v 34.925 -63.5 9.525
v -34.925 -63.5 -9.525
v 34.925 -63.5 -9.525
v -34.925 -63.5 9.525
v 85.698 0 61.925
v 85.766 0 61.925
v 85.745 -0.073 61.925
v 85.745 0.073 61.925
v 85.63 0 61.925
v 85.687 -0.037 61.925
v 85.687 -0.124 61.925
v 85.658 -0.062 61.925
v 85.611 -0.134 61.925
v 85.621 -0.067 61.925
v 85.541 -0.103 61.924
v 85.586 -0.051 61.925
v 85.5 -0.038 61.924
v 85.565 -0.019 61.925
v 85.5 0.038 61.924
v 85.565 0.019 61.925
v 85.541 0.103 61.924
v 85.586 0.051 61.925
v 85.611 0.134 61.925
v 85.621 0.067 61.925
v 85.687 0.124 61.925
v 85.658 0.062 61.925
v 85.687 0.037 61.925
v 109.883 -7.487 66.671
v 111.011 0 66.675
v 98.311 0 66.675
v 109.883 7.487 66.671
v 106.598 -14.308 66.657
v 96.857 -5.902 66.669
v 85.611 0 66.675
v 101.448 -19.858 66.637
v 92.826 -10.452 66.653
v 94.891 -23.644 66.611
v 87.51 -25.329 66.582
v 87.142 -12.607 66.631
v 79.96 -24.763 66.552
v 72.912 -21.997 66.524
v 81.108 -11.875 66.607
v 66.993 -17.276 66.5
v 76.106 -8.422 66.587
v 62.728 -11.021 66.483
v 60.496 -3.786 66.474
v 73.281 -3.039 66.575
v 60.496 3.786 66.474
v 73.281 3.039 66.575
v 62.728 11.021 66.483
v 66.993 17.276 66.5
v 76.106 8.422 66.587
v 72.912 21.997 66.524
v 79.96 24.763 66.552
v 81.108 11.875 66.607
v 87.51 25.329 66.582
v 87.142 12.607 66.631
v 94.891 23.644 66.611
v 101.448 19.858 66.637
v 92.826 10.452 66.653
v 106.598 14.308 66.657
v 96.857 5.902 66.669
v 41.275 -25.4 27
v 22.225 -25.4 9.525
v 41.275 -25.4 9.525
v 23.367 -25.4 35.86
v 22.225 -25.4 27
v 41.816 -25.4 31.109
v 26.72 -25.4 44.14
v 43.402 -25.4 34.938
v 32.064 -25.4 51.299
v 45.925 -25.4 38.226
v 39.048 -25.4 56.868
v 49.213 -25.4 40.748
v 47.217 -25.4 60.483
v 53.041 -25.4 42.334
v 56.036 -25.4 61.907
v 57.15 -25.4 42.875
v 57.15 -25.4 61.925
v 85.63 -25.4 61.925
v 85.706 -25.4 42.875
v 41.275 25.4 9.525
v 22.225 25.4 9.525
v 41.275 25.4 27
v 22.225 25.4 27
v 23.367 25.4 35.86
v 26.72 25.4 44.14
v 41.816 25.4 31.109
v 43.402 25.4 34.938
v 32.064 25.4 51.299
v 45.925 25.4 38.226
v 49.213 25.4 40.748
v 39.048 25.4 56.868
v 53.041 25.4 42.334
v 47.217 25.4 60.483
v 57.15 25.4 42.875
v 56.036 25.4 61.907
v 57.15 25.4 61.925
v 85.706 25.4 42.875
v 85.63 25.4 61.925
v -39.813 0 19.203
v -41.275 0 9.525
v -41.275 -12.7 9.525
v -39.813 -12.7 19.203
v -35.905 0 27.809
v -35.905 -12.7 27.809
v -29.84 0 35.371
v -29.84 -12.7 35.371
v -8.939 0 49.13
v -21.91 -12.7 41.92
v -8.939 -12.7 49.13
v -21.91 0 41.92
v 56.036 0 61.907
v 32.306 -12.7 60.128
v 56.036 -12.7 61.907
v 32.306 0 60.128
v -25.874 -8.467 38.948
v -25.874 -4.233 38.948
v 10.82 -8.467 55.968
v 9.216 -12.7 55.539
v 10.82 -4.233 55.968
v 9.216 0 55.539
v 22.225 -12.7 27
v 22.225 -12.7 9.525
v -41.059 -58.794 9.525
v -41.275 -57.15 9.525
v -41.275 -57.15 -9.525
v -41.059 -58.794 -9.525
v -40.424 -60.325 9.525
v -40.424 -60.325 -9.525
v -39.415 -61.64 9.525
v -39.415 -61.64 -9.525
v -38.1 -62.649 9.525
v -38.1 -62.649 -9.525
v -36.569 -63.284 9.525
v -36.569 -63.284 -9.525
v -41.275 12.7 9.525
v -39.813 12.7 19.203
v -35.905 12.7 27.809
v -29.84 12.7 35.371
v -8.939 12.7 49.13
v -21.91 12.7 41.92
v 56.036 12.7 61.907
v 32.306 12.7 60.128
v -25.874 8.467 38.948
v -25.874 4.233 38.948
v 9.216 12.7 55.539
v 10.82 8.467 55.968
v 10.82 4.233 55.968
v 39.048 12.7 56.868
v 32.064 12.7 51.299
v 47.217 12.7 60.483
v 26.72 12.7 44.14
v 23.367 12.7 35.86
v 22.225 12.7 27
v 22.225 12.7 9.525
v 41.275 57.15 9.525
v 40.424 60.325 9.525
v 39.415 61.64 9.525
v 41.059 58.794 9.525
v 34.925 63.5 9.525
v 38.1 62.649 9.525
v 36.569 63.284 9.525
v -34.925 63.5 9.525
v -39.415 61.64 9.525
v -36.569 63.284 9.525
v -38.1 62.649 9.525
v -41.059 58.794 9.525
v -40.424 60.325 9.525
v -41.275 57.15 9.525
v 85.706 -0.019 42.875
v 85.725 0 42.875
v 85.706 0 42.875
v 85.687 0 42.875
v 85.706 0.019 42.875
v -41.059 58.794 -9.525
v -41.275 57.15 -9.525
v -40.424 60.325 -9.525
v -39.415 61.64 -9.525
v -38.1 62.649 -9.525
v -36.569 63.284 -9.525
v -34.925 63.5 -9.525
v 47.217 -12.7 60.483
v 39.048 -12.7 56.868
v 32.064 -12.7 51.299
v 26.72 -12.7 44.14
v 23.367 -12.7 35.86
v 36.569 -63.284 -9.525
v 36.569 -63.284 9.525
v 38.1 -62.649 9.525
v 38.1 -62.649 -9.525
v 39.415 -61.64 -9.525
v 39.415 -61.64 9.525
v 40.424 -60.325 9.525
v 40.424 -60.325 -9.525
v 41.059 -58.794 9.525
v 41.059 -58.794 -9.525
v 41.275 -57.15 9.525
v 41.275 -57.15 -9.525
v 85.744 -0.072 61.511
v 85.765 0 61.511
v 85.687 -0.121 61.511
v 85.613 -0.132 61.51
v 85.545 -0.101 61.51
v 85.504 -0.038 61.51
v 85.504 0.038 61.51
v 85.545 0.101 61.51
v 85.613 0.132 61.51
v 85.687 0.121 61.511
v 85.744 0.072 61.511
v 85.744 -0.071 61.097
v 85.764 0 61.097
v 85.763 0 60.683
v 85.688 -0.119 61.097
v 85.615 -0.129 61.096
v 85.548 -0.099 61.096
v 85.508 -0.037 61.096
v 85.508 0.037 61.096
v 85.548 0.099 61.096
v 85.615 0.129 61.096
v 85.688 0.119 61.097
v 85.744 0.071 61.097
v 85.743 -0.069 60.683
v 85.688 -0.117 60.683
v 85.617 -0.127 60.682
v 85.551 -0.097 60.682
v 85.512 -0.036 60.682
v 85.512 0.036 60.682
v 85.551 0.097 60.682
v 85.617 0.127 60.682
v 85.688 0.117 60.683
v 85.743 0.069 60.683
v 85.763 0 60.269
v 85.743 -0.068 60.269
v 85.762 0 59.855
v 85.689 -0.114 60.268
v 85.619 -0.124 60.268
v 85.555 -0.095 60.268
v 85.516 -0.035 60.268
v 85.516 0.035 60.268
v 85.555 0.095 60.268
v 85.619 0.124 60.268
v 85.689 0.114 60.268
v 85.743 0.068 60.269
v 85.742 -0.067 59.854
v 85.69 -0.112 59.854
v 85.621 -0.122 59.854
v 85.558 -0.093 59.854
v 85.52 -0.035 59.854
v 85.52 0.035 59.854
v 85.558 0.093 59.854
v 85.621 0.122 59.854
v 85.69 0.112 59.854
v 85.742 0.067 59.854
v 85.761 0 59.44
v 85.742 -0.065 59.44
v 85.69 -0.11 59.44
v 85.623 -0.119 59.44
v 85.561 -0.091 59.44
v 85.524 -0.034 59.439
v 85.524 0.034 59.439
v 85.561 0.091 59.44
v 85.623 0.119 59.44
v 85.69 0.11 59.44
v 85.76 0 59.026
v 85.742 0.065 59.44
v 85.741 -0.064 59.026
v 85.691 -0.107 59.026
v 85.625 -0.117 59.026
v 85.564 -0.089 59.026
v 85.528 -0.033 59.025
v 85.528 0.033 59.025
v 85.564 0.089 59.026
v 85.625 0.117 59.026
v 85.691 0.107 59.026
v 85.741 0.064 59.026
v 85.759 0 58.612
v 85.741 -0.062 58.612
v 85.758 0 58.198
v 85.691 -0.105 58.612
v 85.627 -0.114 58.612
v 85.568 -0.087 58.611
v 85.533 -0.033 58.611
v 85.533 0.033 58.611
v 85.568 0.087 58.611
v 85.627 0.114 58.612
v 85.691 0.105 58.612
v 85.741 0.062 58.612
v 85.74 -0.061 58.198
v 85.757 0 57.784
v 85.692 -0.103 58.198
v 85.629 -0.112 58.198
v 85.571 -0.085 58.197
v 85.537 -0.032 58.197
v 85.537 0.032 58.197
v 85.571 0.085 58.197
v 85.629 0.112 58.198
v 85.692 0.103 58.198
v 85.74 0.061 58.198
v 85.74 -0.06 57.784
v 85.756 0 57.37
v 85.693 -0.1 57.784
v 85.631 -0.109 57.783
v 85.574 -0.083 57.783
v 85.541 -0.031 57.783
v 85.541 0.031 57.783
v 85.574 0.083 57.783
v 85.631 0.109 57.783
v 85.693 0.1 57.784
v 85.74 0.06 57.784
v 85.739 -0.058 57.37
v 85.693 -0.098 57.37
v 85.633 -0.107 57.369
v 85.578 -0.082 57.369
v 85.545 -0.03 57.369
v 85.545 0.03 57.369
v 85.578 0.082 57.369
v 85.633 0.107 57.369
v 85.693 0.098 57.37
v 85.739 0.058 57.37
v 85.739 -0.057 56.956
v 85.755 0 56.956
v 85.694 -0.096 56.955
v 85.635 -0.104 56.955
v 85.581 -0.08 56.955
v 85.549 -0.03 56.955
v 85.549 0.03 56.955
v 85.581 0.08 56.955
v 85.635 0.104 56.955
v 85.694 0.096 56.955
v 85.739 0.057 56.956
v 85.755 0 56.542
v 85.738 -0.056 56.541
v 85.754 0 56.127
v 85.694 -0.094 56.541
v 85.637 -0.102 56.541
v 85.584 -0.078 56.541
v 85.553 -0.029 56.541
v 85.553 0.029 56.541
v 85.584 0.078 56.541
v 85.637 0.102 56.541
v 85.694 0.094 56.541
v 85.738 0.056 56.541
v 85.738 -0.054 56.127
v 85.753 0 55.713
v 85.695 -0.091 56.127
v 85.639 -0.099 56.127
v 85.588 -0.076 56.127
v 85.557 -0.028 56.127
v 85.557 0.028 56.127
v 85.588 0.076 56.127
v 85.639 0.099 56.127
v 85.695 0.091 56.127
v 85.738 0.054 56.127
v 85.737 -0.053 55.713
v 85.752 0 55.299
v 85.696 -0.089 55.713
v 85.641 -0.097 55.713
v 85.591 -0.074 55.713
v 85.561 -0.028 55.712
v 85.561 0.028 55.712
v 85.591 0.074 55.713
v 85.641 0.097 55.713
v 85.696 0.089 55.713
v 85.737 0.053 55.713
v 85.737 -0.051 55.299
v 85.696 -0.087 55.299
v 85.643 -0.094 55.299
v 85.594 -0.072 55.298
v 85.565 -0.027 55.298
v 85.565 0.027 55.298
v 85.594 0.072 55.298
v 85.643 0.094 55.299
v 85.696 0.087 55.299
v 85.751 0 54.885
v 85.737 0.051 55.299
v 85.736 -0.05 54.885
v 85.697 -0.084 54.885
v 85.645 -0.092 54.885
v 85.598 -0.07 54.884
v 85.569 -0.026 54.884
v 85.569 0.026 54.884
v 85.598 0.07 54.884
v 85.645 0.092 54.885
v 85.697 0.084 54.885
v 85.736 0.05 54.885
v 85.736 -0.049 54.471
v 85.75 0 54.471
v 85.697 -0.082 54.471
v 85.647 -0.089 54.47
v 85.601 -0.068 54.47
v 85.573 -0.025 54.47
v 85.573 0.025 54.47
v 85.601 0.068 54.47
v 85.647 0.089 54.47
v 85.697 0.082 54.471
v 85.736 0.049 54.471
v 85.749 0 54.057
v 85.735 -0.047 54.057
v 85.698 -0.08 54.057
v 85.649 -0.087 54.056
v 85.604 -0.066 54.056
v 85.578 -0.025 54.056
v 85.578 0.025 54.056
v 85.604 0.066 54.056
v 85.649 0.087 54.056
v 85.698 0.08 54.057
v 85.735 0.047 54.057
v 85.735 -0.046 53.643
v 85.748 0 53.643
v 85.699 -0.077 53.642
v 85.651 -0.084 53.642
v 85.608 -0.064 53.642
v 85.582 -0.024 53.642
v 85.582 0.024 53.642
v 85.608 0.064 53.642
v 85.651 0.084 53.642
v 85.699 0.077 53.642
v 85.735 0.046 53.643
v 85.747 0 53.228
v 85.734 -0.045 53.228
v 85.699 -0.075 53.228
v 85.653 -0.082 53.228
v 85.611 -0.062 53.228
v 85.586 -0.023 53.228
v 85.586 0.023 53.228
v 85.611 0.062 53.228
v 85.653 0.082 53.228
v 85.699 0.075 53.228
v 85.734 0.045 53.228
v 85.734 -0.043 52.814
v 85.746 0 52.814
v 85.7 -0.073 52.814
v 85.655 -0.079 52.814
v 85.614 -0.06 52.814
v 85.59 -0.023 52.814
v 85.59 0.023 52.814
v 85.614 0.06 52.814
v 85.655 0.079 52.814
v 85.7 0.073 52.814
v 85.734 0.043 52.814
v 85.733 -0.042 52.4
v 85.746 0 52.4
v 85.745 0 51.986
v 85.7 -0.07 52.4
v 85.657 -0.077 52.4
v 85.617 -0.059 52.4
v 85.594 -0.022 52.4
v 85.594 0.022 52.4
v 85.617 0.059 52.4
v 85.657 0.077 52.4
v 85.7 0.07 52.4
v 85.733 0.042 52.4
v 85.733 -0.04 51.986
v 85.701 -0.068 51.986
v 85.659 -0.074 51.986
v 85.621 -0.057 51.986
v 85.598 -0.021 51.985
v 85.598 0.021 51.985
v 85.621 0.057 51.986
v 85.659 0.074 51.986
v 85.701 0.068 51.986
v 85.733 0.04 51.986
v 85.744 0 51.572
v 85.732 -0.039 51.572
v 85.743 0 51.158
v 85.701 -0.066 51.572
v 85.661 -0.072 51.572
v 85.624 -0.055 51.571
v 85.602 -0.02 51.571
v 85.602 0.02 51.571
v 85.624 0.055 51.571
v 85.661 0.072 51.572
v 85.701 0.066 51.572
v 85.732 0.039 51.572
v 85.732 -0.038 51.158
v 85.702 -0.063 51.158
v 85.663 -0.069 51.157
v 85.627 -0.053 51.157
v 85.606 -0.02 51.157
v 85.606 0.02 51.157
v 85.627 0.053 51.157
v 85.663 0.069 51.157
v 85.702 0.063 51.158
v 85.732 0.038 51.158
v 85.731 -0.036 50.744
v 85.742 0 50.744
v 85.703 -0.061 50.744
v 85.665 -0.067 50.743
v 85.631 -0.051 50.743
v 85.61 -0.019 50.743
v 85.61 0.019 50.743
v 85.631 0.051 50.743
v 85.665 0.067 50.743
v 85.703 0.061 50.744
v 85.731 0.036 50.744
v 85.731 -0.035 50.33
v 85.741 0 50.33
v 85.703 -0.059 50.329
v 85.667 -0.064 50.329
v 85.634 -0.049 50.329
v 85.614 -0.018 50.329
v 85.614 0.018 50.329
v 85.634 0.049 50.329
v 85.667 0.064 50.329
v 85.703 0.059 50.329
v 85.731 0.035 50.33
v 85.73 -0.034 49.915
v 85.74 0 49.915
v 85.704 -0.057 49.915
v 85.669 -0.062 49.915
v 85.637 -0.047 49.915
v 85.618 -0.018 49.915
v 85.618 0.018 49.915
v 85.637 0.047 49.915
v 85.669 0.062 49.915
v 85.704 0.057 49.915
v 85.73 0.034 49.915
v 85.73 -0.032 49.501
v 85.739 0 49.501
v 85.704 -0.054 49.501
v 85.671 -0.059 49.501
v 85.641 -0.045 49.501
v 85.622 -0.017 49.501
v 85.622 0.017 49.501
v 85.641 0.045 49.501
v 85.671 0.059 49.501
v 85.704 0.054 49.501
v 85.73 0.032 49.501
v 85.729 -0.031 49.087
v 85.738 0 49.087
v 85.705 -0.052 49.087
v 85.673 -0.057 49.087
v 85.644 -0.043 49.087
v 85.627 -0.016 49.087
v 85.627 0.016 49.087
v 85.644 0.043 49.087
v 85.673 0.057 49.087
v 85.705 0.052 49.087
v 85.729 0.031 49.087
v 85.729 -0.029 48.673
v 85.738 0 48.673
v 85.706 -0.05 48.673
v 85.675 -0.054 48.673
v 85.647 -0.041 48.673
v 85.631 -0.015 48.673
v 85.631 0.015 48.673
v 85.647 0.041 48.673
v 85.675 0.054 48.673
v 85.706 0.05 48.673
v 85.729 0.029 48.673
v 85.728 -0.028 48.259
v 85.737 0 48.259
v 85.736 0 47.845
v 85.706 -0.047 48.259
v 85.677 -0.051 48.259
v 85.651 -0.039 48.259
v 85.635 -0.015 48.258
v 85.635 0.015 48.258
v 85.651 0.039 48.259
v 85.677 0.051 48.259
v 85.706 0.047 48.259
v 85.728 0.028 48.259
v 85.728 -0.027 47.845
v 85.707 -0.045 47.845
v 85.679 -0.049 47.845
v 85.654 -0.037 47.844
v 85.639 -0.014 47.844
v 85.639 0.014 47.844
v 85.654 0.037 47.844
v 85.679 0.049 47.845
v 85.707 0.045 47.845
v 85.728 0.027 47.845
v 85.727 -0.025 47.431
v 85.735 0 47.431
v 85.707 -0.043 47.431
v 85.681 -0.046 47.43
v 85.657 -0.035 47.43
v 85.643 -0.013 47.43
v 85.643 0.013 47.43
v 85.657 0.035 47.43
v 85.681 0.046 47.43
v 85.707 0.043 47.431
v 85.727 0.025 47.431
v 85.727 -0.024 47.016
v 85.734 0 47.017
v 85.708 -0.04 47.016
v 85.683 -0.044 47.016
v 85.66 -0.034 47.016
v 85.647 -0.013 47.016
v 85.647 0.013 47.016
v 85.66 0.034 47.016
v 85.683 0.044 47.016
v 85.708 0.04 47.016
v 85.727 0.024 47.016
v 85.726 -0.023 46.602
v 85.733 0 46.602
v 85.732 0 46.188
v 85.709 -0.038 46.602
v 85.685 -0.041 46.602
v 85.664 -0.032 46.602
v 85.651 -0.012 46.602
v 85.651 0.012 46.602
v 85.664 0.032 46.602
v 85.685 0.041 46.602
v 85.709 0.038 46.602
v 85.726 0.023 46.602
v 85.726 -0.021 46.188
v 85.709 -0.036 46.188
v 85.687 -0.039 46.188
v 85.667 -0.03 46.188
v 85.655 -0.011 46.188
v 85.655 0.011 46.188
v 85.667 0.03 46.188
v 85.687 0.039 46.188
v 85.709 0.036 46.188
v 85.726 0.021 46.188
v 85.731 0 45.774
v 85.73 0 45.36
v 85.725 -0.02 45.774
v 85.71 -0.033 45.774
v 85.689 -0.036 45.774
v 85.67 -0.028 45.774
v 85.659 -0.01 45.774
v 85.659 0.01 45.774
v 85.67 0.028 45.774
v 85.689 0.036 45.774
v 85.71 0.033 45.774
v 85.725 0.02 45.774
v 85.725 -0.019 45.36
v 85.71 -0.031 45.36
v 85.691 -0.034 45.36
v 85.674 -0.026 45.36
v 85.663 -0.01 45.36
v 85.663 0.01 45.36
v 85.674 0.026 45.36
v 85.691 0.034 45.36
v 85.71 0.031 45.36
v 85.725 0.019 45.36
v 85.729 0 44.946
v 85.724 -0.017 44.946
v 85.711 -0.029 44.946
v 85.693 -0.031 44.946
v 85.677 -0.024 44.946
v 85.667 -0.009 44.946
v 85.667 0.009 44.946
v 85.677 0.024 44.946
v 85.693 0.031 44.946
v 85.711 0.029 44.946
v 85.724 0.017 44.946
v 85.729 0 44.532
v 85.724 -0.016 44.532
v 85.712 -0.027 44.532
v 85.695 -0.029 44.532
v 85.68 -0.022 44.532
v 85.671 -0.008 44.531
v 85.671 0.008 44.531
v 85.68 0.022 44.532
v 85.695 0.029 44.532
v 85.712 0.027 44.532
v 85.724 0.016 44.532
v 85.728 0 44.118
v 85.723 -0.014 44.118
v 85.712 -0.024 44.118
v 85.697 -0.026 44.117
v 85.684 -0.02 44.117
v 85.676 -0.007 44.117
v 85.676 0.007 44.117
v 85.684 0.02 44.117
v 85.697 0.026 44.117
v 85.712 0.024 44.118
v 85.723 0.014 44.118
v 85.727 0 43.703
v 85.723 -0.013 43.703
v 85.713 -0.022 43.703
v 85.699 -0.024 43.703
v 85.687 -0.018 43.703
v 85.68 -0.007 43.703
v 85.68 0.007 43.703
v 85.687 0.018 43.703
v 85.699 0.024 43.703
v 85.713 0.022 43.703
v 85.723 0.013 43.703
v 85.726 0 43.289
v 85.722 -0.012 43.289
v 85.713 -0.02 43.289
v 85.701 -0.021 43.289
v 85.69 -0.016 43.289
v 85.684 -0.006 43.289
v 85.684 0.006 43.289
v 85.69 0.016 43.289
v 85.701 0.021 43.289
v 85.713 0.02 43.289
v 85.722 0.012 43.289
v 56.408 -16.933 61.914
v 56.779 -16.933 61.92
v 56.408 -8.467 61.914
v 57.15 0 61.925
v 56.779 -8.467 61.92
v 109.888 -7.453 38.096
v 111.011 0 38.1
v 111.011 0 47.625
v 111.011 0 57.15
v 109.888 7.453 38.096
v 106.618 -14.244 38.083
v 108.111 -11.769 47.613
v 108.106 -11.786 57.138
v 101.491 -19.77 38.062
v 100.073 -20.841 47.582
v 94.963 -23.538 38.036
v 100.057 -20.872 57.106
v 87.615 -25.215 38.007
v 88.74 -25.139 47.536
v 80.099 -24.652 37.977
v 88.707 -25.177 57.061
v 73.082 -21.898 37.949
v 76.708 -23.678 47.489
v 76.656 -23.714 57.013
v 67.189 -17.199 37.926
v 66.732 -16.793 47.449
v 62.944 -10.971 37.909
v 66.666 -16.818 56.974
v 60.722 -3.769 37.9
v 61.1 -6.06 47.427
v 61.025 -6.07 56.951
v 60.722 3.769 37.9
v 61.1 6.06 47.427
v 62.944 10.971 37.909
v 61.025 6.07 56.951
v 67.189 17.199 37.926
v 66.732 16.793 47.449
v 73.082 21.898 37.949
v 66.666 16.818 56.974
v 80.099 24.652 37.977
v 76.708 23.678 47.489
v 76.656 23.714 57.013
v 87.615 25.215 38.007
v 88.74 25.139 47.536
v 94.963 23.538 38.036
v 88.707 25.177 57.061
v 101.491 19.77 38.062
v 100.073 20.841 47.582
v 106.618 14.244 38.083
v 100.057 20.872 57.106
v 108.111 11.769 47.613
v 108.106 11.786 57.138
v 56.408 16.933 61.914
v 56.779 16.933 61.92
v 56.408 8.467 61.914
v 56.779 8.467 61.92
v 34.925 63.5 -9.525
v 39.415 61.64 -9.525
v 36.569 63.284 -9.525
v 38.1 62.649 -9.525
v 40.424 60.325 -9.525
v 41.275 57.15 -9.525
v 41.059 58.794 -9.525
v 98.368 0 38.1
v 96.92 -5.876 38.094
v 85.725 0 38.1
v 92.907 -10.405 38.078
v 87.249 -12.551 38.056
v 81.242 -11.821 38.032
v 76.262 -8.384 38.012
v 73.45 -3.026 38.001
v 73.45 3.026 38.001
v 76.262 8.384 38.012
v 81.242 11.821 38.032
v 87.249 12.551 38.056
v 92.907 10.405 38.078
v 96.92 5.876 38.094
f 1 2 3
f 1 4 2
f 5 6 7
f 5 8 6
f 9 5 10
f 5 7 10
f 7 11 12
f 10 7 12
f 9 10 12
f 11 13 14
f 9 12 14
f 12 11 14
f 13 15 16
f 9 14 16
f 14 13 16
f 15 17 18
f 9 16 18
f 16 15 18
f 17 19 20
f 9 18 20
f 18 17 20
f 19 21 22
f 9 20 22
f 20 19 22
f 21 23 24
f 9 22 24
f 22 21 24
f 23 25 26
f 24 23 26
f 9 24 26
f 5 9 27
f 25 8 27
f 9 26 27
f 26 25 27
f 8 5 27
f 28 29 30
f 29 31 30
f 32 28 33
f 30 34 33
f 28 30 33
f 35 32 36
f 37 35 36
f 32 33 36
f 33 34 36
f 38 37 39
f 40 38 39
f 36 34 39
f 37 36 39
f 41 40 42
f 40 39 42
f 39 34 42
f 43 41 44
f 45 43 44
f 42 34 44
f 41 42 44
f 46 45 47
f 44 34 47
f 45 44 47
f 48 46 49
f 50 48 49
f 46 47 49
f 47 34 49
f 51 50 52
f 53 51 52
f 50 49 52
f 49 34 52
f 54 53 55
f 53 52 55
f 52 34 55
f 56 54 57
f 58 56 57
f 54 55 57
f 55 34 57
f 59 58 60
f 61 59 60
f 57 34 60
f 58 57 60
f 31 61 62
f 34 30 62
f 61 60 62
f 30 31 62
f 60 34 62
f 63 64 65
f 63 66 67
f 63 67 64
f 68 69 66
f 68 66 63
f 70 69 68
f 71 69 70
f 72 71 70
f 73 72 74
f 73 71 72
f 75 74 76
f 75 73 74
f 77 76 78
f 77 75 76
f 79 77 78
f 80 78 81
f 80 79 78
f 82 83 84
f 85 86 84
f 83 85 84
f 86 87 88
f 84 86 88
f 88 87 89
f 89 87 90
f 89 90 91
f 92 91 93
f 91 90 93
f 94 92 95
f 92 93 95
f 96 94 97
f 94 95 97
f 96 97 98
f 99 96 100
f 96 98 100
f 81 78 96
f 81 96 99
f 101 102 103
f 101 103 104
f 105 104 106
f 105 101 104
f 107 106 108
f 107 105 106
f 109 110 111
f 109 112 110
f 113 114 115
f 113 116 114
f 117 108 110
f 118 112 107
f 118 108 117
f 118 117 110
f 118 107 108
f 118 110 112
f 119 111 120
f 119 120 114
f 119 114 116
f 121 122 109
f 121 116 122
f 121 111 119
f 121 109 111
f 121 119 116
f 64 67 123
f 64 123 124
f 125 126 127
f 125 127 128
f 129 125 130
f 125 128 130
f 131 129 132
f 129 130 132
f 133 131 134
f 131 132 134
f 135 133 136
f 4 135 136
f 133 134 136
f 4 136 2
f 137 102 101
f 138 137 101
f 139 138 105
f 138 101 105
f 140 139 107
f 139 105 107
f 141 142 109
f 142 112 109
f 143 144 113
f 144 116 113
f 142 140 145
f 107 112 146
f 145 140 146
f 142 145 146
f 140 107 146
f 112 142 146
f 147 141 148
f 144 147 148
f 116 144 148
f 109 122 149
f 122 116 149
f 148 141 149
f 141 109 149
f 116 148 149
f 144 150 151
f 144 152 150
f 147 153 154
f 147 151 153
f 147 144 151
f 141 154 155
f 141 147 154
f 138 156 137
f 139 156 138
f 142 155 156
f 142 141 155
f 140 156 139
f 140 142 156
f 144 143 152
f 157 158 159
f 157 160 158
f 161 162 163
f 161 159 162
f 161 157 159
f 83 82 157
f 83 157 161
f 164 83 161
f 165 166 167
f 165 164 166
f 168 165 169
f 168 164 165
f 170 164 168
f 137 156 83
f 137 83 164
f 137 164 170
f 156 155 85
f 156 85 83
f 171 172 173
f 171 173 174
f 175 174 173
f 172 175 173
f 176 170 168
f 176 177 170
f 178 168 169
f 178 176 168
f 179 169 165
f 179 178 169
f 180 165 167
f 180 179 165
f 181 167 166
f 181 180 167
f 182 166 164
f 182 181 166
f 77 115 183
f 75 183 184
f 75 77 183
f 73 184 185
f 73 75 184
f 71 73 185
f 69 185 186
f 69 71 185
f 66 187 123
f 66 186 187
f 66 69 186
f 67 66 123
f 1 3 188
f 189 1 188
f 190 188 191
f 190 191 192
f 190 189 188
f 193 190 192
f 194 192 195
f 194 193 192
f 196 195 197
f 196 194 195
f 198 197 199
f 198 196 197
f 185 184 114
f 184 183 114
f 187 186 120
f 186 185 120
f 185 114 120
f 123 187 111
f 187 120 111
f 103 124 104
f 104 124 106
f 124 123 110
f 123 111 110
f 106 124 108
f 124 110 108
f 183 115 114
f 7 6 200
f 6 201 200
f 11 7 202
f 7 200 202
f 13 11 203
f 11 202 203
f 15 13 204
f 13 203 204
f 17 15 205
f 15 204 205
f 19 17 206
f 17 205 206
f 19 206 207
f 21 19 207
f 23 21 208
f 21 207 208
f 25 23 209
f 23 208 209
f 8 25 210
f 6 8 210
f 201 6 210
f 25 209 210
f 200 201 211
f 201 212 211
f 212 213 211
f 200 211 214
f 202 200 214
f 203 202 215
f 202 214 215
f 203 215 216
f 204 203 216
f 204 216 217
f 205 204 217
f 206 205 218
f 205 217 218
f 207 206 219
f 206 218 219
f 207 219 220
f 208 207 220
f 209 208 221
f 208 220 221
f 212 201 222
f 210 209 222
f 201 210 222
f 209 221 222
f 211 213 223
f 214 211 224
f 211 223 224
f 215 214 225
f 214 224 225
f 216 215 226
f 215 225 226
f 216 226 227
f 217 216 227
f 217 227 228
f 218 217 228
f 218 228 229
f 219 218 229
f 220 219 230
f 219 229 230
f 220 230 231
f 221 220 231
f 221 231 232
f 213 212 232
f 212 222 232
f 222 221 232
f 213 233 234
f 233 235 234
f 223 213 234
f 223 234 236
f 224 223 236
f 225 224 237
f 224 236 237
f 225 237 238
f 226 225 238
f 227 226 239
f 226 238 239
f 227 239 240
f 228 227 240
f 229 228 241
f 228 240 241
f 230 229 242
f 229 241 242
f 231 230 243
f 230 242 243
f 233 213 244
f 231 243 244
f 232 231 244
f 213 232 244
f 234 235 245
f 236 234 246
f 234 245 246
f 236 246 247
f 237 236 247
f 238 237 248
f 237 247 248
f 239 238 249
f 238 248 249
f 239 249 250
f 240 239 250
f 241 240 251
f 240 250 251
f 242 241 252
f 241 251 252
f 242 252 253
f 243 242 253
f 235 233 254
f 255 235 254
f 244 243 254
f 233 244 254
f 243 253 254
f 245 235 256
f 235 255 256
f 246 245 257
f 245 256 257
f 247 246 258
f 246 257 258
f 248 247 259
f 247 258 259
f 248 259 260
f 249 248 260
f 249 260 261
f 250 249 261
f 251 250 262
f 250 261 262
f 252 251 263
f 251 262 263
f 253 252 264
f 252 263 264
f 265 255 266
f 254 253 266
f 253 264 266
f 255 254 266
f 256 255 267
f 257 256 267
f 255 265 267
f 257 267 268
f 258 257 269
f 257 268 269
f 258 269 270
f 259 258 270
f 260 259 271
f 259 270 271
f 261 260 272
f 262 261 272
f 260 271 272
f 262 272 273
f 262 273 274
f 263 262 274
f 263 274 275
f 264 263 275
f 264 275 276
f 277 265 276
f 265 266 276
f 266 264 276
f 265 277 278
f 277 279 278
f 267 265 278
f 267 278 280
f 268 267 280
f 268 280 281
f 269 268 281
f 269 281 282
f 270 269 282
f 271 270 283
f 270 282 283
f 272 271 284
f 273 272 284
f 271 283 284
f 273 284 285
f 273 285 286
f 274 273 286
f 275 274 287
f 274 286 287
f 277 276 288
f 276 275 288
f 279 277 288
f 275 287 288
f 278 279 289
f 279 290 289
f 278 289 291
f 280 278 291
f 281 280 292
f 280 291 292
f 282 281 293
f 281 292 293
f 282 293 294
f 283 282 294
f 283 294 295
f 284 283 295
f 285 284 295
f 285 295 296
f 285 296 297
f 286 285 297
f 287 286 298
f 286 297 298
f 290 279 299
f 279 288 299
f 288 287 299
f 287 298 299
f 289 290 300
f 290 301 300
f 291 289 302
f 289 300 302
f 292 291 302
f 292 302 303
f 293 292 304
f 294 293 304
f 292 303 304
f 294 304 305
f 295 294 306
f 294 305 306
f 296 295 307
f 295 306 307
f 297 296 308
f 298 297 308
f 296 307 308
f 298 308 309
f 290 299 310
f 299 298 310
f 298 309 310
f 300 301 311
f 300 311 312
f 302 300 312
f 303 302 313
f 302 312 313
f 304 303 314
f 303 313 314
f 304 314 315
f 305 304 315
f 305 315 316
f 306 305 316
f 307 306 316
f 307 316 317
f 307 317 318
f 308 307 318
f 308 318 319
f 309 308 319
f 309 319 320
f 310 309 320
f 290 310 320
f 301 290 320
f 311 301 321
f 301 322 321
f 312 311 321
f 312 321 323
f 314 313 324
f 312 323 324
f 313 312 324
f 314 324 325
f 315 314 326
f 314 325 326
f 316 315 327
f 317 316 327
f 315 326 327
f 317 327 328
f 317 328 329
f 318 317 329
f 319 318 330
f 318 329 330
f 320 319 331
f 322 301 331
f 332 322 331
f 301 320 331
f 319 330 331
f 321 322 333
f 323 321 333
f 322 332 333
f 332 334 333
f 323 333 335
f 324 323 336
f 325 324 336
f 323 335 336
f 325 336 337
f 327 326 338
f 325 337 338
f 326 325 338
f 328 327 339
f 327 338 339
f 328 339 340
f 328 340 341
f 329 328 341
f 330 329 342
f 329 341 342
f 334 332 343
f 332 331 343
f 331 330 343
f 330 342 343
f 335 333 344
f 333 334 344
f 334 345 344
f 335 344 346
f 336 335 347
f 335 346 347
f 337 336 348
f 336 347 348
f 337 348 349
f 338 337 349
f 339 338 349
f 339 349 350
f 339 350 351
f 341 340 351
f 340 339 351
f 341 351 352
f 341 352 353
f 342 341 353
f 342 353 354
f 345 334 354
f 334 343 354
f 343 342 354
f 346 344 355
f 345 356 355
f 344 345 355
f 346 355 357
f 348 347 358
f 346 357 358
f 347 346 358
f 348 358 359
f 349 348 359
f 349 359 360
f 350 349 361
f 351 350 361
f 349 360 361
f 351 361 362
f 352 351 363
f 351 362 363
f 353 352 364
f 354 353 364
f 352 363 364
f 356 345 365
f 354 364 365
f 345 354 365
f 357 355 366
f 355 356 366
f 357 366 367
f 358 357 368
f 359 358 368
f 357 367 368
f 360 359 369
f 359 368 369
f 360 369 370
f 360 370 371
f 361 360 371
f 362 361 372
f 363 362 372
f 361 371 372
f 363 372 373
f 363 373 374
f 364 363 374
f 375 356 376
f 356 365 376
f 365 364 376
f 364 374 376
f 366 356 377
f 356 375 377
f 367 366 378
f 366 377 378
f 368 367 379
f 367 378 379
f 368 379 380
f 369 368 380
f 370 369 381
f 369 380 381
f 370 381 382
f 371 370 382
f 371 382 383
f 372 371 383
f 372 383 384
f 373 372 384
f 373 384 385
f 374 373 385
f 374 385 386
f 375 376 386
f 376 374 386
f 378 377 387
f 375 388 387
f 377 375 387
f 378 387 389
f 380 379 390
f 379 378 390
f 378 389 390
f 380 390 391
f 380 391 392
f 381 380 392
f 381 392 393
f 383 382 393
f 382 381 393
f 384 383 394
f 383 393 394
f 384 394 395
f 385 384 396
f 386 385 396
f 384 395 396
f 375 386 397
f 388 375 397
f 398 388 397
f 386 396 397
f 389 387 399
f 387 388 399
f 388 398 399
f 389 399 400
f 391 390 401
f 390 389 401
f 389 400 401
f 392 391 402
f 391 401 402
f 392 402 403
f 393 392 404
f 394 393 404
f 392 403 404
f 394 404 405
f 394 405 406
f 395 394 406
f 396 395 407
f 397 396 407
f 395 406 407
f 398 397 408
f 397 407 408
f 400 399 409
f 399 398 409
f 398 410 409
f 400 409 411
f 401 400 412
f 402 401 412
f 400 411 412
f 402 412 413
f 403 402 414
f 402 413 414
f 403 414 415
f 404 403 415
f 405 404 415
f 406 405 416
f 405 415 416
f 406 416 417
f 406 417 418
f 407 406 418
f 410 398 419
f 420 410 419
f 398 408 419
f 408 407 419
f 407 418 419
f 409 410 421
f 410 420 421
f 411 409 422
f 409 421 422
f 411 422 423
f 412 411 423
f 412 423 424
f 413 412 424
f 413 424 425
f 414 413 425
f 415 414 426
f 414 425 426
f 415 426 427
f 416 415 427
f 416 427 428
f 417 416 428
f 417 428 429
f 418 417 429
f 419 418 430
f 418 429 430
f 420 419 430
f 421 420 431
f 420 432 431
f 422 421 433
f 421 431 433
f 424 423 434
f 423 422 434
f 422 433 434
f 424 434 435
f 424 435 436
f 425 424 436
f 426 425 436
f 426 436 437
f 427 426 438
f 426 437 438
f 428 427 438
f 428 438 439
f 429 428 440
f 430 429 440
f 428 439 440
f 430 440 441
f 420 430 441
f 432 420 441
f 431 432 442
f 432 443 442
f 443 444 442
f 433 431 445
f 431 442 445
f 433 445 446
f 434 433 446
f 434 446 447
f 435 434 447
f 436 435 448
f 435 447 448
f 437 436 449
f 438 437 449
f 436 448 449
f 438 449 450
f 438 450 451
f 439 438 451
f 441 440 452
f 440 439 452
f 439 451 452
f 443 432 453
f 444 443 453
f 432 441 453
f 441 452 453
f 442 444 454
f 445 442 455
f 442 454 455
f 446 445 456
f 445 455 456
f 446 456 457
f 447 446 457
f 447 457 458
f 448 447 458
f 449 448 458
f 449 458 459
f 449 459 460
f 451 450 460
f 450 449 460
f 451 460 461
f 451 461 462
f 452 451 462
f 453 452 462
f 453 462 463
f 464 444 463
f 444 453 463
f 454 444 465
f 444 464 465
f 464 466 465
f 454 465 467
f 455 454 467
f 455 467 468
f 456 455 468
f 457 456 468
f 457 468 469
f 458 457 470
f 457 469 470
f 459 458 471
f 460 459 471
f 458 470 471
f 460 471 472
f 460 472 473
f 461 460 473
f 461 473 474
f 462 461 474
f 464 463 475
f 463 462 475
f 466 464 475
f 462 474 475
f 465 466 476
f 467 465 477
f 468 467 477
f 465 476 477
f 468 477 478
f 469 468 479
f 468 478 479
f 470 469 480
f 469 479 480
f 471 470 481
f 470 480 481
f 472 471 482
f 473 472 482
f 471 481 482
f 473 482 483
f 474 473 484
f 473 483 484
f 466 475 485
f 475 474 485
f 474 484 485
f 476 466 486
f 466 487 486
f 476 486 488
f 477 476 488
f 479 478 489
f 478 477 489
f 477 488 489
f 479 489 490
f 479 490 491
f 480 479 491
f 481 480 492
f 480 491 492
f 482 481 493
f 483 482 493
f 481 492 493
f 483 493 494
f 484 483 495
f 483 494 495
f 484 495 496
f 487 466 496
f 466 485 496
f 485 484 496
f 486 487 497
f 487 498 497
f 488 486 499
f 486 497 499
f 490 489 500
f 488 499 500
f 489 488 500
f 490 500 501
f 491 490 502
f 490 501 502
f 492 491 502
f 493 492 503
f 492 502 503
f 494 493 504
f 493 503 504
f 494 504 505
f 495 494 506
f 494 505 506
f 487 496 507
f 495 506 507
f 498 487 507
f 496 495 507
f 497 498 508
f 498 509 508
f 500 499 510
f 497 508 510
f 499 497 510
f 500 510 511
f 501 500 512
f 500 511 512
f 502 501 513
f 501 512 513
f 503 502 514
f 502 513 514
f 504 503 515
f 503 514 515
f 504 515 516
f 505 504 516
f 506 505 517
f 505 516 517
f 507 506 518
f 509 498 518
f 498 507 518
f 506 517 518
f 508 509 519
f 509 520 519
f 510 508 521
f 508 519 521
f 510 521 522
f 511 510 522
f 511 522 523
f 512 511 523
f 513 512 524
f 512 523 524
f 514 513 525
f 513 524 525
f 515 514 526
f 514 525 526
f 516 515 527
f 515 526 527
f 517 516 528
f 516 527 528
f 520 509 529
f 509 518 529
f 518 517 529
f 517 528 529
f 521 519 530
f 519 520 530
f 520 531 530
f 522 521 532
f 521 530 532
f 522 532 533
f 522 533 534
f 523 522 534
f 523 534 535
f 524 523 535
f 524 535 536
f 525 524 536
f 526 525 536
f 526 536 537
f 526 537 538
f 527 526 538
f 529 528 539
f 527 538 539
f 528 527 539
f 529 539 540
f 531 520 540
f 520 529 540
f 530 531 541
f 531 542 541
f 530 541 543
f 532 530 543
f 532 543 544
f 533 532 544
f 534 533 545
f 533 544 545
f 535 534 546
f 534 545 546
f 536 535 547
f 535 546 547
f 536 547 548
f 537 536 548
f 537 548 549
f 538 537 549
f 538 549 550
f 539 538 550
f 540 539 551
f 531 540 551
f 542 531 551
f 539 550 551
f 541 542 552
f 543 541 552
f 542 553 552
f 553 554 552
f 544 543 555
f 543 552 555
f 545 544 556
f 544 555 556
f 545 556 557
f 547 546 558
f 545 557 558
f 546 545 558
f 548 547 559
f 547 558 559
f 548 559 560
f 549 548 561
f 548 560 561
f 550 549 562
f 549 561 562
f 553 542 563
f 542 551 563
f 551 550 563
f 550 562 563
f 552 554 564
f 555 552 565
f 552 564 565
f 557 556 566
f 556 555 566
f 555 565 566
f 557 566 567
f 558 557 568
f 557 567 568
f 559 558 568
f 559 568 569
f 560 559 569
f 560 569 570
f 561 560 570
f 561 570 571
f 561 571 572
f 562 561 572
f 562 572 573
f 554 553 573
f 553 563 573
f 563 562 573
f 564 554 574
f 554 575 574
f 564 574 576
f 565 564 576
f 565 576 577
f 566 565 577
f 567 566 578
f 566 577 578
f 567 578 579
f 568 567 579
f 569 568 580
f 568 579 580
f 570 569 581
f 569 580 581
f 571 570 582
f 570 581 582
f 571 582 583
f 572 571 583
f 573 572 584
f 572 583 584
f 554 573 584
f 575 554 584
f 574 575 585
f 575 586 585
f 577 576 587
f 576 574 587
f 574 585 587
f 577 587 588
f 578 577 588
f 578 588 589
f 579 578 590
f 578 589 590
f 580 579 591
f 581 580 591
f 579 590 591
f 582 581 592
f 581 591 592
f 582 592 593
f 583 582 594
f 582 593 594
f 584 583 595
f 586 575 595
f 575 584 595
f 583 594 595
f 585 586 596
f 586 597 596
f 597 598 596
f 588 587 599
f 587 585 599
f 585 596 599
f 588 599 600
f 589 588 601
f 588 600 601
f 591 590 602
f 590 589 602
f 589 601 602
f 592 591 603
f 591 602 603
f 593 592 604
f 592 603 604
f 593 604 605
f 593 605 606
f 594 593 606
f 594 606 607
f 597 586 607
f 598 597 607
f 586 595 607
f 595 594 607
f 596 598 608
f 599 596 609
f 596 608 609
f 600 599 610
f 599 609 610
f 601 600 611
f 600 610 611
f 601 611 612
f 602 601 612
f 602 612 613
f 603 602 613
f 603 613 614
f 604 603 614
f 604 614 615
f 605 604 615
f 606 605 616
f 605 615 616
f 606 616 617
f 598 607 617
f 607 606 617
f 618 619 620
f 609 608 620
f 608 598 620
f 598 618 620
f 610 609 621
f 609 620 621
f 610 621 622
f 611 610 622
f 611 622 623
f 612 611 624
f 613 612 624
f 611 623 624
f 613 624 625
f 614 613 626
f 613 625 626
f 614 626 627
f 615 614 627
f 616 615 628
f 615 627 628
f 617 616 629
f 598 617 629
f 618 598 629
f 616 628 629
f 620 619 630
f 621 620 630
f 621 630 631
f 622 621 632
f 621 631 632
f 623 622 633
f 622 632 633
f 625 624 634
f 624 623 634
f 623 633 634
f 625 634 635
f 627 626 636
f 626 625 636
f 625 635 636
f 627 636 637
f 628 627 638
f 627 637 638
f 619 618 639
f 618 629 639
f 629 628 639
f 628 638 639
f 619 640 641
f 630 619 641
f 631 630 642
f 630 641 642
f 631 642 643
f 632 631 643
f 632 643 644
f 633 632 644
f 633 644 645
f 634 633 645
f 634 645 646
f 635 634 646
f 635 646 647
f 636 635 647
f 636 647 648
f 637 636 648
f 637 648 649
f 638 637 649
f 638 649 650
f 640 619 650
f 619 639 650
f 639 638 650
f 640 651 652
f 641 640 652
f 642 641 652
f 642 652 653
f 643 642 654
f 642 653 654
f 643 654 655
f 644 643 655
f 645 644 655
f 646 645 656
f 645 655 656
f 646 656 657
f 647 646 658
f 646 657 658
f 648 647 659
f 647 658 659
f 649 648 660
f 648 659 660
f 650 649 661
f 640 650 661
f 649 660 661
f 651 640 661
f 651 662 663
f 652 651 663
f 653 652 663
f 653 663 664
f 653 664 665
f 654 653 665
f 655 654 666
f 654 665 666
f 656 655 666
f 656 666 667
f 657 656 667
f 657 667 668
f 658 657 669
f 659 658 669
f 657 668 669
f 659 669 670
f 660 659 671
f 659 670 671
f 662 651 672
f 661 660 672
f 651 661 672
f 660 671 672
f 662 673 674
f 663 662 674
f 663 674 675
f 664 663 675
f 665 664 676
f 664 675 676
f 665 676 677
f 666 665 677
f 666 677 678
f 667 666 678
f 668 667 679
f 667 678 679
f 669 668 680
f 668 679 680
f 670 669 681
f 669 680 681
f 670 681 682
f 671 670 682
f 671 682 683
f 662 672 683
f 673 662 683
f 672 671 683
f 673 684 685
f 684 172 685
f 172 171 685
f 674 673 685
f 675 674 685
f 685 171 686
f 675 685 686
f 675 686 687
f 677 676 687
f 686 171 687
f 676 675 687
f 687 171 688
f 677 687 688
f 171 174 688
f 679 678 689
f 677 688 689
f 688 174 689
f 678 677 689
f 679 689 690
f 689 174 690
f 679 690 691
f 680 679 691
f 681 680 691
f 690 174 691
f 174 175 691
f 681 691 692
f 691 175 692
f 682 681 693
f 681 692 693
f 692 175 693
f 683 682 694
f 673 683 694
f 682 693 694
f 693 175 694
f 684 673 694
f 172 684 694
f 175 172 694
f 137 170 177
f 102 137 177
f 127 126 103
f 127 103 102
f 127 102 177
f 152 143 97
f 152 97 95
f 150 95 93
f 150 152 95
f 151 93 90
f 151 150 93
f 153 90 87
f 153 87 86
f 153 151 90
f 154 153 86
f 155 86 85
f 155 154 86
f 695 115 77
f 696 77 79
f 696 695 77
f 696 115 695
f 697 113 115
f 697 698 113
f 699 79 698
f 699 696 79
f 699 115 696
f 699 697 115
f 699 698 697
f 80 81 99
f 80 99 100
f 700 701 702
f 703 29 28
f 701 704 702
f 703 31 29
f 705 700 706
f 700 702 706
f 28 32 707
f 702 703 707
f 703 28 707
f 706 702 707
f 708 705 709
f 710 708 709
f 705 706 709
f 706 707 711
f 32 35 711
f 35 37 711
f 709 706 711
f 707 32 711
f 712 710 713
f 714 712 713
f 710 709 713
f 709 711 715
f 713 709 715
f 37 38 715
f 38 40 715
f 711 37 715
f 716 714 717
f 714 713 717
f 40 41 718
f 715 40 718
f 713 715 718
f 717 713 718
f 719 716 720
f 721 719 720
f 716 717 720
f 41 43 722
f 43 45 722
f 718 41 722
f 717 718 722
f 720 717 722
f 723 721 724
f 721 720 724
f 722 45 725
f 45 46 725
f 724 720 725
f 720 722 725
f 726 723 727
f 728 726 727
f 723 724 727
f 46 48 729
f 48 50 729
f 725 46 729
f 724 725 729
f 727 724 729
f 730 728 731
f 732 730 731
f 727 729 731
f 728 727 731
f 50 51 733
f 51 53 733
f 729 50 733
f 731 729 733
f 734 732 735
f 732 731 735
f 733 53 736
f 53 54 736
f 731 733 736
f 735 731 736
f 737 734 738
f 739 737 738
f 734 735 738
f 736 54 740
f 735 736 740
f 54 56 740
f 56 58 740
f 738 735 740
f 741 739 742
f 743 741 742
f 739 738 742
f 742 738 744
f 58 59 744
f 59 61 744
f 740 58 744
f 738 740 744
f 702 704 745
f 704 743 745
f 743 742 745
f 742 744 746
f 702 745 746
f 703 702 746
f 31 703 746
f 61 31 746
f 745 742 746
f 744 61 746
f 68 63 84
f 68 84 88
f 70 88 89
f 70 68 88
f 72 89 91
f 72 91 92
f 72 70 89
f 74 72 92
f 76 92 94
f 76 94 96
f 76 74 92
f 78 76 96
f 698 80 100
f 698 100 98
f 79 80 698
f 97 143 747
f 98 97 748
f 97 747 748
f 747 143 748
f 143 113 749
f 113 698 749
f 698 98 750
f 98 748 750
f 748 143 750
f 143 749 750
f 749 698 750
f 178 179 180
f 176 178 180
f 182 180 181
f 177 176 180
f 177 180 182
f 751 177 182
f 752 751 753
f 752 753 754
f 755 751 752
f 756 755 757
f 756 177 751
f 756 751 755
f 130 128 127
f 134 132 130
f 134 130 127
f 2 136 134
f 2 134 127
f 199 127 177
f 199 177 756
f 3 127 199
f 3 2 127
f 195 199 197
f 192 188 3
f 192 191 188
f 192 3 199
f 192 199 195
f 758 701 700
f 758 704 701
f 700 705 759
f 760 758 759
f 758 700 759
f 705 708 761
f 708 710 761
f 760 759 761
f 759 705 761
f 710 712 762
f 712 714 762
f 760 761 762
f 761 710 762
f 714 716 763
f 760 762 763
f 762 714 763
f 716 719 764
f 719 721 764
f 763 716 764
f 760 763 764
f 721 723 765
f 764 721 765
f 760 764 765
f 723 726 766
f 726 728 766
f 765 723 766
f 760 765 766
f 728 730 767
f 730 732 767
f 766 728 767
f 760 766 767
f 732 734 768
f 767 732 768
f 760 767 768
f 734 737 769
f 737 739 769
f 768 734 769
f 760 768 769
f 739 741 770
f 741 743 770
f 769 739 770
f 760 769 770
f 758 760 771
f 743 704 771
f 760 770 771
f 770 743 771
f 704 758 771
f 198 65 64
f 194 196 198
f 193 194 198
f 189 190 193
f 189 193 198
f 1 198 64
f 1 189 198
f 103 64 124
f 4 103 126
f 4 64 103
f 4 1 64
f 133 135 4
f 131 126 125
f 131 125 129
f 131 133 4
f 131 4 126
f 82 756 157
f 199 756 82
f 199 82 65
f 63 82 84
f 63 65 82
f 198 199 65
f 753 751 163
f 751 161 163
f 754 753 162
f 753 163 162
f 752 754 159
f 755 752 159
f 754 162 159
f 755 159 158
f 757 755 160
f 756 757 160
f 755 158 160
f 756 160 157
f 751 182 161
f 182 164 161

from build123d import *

# Parameters (mm, degrees)
F1_DEPTH = 63.5
F2_DEPTH = 25.4
F3_DEPTH = 12.7
F5_R     = 6.35


with BuildPart() as f1:
    # F0 (on Front) → F1 (new body, symmetric)
    with BuildSketch(Plane.XZ):
        Polygon((-41.275, -9.525), (41.275, -9.525), (41.275, 9.525), (22.225, 9.525), (-41.275, 9.525), align=None)
    extrude(amount=F1_DEPTH, both=True)

    # F0 (on Front) → F2 (join, symmetric)
    with BuildSketch(Plane.XZ):
        with BuildLine():
            Line((22.225, 9.525), (41.275, 9.525))
            Line((41.275, 9.525), (41.275, 27.0002))
            ThreePointArc((41.275, 27.0002), (45.9246798487, 38.2255201513), (57.15, 42.8752))
            Line((57.15, 42.8752), (60.2113806367, 42.8752))
            Line((60.2113806367, 42.8752), (60.2113806367, 61.9252))
            Line((60.2113806367, 61.9252), (57.15, 61.9252))
            add(Edge.make_bspline(
                [(56.0362595427, 61.907437175), (56.4079474882, 61.9143458561), (56.7792049443, 61.9202656965), (57.15, 61.9252)],
                knots=[110.5955102267, 110.5955102267, 110.5955102267, 110.5955102267, 111.5045361635, 111.5045361635, 111.5045361635, 111.5045361635], degree=3))
            ThreePointArc((56.0362595427, 61.907437175), (32.0636191284, 51.298947288), (22.225, 27.0002))
            Line((22.225, 27.0002), (22.225, 9.525))
        make_face()
        Polygon((60.2113806367, 61.9252), (60.2113806367, 42.8752), (85.706012942, 42.8752), (85.6302666997, 61.9252), align=None)
    extrude(amount=F2_DEPTH, both=True)

    # F0 (on Front) → F3 (join, symmetric)
    with BuildSketch(Plane.XZ):
        with BuildLine():
            add(Edge.make_bspline(
                [(-41.275, 9.525), (-40.7777766122, 45.5894744697), (10.8153078523, 61.0669010776), (56.0362595427, 61.907437175)],
                knots=[0, 0, 0, 0, 110.5955102267, 110.5955102267, 110.5955102267, 110.5955102267], degree=3))
            Line((-41.275, 9.525), (22.225, 9.525))
            Line((22.225, 9.525), (22.225, 27.0002))
            ThreePointArc((22.225, 27.0002), (32.0636191284, 51.298947288), (56.0362595427, 61.907437175))
        make_face()
    extrude(amount=F3_DEPTH, both=True)

    # F5
    f5_edges = [f1.edges().sort_by_distance(p)[0] for p in [
        (41.275, -63.5, 0),
        (-41.275, -63.5, 0),
        (41.275, 63.5, 0),
        (-41.275, 63.5, 0),
    ]]
    fillet(f5_edges, radius=F5_R)


with BuildPart() as f4:
    # F0 (on Front) → F4 (revolve)
    with BuildSketch(Plane.XZ):
        Polygon((85.725, 42.8752), (85.706012942, 42.8752), (85.725, 38.1), (111.0113806367, 38.1), (111.0113806367, 66.675), (85.6113806367, 66.675), (85.6302666997, 61.9252), (85.7661366463, 61.9252), align=None)
    revolve(axis=Axis((85.6681903183, 0, 52.3875), (0.0039761493, 0, -0.9999920951)))


solid = Compound([f1.part, f4.part])
